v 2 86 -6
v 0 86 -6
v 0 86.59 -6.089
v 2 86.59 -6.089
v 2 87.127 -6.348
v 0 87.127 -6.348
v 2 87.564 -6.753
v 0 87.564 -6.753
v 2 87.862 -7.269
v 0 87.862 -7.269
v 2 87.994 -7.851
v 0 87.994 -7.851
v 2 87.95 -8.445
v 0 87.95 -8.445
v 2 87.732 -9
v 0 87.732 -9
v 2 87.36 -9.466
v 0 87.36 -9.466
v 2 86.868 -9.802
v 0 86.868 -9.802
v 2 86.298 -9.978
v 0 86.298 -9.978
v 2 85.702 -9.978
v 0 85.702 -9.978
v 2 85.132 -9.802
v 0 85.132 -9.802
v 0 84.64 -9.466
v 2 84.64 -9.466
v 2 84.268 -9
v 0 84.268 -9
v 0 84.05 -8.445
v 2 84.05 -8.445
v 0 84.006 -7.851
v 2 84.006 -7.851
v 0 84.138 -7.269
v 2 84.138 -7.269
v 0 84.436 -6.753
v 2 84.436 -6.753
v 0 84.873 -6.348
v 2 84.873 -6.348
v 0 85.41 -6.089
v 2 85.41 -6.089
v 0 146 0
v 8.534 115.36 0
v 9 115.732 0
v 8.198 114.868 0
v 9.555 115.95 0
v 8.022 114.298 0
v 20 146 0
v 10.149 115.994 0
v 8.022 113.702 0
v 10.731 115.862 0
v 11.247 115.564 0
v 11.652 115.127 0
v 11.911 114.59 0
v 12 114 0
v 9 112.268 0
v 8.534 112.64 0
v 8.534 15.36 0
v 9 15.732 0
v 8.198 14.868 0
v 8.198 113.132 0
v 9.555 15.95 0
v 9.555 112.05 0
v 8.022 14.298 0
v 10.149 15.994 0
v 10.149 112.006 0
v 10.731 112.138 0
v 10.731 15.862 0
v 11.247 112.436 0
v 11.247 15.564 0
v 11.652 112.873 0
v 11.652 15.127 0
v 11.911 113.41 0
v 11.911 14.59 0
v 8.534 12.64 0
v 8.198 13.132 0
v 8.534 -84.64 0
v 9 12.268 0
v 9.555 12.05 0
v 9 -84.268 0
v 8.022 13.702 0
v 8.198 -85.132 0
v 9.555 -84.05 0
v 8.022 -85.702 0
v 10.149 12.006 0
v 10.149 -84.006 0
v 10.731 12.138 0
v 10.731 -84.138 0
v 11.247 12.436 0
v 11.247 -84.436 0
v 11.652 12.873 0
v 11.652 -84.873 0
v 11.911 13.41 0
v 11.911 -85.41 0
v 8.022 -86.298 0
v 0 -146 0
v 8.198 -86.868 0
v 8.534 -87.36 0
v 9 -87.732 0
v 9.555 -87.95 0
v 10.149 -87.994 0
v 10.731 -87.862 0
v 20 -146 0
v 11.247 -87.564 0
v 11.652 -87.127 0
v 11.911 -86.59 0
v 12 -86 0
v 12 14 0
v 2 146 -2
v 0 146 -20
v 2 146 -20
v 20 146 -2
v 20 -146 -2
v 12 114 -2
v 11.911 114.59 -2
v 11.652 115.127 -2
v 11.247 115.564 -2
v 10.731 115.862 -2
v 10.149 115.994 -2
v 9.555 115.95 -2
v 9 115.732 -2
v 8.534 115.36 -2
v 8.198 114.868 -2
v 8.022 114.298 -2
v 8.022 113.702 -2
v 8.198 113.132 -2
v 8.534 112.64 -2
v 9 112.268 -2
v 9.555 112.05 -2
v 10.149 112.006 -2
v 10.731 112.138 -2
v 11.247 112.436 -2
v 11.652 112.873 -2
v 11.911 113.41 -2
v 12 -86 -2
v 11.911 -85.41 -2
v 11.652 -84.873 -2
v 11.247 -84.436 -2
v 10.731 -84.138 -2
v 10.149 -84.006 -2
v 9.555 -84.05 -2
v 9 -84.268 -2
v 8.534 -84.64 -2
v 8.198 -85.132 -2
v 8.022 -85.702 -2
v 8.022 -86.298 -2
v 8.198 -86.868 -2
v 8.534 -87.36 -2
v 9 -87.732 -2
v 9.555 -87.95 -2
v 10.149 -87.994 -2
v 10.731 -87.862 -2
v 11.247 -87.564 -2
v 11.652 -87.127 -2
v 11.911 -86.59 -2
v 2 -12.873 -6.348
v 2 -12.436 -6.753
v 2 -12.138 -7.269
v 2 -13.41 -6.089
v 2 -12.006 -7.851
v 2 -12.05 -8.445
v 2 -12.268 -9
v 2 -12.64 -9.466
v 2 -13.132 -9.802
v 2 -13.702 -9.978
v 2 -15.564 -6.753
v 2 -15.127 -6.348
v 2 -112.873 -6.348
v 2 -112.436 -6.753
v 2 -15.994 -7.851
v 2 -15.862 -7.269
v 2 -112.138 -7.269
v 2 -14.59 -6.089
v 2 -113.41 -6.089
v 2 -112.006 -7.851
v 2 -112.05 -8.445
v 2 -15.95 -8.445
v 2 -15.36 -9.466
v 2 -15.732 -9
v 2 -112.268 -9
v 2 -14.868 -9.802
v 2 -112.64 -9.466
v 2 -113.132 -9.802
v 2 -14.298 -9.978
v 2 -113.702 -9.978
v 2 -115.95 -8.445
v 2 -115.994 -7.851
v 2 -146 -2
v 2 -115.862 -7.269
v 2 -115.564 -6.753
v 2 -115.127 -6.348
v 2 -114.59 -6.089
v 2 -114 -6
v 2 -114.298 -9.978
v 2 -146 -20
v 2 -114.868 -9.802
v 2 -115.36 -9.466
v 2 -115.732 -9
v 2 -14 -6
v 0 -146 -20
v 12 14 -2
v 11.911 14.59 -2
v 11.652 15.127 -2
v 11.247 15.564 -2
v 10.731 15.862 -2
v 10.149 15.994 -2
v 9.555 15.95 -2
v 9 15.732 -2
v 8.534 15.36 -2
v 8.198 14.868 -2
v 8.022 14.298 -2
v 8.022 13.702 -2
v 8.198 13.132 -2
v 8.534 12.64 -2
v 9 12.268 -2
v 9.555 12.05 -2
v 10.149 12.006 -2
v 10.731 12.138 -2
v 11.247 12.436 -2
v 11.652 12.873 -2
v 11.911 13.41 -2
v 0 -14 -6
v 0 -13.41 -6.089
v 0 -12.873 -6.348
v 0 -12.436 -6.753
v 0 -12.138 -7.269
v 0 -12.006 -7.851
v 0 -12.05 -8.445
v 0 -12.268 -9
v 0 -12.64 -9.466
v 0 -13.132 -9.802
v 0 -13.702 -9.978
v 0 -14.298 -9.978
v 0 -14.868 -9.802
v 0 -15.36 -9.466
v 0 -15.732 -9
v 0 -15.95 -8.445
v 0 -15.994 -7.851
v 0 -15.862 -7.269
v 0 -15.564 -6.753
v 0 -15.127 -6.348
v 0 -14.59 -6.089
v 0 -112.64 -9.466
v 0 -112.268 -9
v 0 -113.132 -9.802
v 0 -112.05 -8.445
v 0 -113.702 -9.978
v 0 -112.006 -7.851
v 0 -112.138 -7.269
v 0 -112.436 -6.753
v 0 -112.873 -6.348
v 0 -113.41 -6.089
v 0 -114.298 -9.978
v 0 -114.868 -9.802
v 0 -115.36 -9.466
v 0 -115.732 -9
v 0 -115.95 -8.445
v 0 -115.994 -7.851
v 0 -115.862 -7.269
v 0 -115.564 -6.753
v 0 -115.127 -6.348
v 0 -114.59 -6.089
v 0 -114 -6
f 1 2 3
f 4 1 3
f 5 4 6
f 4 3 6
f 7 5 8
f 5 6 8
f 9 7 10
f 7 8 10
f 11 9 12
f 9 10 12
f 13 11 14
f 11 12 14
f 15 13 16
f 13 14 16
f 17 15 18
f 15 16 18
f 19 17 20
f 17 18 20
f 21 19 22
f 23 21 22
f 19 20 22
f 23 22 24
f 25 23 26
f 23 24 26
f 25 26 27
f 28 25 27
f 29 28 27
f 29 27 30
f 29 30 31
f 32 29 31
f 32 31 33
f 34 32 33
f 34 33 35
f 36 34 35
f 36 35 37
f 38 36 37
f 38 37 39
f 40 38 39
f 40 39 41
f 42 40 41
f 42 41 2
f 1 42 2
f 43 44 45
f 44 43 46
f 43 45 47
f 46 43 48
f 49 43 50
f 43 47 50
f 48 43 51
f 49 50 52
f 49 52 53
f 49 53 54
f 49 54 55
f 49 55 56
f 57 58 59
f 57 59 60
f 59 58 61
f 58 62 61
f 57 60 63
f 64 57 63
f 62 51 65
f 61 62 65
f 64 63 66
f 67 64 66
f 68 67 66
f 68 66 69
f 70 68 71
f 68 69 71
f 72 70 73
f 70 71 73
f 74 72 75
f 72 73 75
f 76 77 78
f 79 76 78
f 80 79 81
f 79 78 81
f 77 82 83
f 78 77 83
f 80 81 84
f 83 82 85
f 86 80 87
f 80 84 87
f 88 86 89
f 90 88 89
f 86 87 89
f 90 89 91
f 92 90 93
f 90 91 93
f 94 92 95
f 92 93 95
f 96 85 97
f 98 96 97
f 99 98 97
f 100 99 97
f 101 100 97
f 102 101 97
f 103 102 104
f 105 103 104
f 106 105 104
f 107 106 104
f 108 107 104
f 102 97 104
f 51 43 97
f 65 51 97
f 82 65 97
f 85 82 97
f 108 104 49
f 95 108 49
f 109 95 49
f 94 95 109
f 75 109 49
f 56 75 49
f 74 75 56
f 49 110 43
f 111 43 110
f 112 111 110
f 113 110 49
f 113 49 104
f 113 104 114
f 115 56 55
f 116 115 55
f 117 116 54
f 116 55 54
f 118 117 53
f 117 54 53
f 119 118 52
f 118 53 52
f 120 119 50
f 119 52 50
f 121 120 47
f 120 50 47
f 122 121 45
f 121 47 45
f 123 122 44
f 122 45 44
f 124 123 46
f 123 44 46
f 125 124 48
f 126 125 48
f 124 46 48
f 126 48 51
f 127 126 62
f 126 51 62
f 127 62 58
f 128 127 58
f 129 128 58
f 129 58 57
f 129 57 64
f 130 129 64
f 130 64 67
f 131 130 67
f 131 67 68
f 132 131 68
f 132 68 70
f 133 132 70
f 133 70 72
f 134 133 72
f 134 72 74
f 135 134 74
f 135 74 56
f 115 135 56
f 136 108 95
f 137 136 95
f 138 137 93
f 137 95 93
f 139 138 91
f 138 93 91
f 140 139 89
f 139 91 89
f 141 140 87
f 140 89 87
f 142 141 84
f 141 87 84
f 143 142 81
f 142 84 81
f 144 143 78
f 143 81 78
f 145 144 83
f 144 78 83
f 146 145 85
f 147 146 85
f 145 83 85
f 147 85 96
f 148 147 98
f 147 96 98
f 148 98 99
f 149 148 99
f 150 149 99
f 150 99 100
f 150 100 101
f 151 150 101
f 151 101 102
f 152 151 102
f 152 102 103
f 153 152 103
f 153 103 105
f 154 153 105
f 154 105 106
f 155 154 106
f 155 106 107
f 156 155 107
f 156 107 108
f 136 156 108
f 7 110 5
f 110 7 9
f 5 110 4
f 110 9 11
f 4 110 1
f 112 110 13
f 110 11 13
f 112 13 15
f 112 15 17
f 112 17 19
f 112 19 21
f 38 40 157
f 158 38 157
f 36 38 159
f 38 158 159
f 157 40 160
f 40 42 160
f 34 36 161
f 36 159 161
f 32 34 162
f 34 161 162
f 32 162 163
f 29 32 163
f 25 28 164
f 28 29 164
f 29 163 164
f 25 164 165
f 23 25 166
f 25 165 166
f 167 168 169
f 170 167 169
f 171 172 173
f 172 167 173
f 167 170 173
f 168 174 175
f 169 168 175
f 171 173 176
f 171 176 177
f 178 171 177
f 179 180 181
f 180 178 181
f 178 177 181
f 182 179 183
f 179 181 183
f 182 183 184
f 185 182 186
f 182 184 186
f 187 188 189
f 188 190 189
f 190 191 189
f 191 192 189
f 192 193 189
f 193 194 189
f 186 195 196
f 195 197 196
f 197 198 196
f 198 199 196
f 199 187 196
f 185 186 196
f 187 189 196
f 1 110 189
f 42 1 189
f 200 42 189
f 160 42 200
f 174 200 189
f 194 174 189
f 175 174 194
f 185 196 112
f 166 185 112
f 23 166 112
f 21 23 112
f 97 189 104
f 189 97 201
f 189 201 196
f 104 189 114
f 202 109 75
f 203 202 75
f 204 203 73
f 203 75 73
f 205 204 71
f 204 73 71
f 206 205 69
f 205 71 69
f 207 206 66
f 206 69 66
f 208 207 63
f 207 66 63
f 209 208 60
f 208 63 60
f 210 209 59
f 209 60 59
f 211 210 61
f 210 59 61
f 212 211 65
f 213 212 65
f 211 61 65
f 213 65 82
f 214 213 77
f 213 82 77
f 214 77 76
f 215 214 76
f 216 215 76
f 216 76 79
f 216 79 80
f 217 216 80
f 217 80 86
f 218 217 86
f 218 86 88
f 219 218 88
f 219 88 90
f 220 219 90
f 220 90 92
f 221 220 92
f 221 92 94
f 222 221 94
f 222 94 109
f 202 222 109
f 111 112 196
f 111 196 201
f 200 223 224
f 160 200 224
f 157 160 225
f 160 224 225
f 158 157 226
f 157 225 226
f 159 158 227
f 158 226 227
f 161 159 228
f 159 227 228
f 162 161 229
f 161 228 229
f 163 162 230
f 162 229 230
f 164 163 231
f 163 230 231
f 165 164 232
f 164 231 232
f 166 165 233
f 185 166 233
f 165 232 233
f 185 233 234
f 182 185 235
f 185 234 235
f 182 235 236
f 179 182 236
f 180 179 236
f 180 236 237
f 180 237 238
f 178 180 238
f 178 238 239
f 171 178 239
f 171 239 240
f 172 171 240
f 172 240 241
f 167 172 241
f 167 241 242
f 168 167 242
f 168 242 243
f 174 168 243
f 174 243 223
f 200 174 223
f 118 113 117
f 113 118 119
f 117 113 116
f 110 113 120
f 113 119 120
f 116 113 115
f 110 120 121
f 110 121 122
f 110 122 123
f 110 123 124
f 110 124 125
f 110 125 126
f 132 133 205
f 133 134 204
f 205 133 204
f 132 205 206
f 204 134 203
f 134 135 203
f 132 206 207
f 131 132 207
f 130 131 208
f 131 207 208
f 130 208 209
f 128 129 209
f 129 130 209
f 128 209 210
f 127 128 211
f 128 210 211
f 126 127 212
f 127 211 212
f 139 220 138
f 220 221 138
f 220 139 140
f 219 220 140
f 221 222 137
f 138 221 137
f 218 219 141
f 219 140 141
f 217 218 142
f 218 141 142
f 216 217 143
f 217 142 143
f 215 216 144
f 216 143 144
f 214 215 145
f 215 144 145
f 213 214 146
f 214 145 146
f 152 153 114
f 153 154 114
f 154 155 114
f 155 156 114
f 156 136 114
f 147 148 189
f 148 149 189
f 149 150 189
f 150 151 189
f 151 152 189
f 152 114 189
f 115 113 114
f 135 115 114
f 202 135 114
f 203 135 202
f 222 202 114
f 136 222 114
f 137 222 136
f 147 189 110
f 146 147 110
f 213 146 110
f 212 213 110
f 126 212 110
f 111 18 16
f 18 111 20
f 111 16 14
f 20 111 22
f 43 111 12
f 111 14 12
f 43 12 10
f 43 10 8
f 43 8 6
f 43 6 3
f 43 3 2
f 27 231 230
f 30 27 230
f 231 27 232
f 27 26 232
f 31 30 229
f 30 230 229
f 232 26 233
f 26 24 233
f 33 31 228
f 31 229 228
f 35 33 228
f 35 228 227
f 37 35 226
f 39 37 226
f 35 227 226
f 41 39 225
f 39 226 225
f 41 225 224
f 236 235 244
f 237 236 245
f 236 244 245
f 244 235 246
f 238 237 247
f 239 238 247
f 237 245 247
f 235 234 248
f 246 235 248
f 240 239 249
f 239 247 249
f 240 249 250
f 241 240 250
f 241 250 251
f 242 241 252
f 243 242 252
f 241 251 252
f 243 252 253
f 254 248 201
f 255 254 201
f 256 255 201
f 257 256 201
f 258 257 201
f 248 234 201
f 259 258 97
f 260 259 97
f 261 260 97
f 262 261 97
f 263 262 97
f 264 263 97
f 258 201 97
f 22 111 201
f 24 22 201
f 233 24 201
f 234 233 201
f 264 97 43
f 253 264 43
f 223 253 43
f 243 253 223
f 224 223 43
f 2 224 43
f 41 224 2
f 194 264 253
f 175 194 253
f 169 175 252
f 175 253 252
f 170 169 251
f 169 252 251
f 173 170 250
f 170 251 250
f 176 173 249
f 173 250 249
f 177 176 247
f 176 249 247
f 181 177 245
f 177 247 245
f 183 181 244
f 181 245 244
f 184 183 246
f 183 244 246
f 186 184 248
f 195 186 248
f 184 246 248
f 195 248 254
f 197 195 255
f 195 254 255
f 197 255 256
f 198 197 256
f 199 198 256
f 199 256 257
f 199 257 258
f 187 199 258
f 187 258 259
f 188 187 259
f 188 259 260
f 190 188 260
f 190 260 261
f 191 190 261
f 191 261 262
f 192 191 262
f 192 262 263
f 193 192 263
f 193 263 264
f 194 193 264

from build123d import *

# Parameters (mm, degrees)
BOSS_EXTRUDE1_DEPTH      = 146
BOSS_EXTRUDE1_DEPTH_BACK = 146
SKETCH2_R                = 2
CUT_EXTRUDE1_DEPTH       = 10
SKETCH3_R                = 2
CUT_EXTRUDE2_DEPTH       = 10


with BuildPart() as part:
    # Sketch1 → Boss-Extrude1 (new, two sides: drawn at the far end of the back side and taken through both)
    with BuildSketch(Plane(origin=(0, 0, 0), x_dir=(1, 0, 0), z_dir=(0, 1, 0)).offset(-BOSS_EXTRUDE1_DEPTH_BACK)):
        Polygon((0, 0), (20, 0), (20, 2), (2, 2), (2, 20), (0, 20), align=None)
    extrude(amount=BOSS_EXTRUDE1_DEPTH + BOSS_EXTRUDE1_DEPTH_BACK)

    # Sketch2 → Cut-Extrude1 (cut)
    with BuildSketch(Plane.XY):
        with Locations((10, 114)):
            Circle(SKETCH2_R)
        with Locations((10, 14)):
            Circle(SKETCH2_R)
        with Locations((10, -86)):
            Circle(SKETCH2_R)
    extrude(amount=-CUT_EXTRUDE1_DEPTH, mode=Mode.SUBTRACT)

    # Sketch3 → Cut-Extrude2 (cut)
    with BuildSketch(Plane.ZY):
        with Locations((-8, -114)):
            Circle(SKETCH3_R)
        with Locations((-8, -14)):
            Circle(SKETCH3_R)
        with Locations((-8, 86)):
            Circle(SKETCH3_R)
    extrude(amount=-CUT_EXTRUDE2_DEPTH, mode=Mode.SUBTRACT)


solid = part.part
